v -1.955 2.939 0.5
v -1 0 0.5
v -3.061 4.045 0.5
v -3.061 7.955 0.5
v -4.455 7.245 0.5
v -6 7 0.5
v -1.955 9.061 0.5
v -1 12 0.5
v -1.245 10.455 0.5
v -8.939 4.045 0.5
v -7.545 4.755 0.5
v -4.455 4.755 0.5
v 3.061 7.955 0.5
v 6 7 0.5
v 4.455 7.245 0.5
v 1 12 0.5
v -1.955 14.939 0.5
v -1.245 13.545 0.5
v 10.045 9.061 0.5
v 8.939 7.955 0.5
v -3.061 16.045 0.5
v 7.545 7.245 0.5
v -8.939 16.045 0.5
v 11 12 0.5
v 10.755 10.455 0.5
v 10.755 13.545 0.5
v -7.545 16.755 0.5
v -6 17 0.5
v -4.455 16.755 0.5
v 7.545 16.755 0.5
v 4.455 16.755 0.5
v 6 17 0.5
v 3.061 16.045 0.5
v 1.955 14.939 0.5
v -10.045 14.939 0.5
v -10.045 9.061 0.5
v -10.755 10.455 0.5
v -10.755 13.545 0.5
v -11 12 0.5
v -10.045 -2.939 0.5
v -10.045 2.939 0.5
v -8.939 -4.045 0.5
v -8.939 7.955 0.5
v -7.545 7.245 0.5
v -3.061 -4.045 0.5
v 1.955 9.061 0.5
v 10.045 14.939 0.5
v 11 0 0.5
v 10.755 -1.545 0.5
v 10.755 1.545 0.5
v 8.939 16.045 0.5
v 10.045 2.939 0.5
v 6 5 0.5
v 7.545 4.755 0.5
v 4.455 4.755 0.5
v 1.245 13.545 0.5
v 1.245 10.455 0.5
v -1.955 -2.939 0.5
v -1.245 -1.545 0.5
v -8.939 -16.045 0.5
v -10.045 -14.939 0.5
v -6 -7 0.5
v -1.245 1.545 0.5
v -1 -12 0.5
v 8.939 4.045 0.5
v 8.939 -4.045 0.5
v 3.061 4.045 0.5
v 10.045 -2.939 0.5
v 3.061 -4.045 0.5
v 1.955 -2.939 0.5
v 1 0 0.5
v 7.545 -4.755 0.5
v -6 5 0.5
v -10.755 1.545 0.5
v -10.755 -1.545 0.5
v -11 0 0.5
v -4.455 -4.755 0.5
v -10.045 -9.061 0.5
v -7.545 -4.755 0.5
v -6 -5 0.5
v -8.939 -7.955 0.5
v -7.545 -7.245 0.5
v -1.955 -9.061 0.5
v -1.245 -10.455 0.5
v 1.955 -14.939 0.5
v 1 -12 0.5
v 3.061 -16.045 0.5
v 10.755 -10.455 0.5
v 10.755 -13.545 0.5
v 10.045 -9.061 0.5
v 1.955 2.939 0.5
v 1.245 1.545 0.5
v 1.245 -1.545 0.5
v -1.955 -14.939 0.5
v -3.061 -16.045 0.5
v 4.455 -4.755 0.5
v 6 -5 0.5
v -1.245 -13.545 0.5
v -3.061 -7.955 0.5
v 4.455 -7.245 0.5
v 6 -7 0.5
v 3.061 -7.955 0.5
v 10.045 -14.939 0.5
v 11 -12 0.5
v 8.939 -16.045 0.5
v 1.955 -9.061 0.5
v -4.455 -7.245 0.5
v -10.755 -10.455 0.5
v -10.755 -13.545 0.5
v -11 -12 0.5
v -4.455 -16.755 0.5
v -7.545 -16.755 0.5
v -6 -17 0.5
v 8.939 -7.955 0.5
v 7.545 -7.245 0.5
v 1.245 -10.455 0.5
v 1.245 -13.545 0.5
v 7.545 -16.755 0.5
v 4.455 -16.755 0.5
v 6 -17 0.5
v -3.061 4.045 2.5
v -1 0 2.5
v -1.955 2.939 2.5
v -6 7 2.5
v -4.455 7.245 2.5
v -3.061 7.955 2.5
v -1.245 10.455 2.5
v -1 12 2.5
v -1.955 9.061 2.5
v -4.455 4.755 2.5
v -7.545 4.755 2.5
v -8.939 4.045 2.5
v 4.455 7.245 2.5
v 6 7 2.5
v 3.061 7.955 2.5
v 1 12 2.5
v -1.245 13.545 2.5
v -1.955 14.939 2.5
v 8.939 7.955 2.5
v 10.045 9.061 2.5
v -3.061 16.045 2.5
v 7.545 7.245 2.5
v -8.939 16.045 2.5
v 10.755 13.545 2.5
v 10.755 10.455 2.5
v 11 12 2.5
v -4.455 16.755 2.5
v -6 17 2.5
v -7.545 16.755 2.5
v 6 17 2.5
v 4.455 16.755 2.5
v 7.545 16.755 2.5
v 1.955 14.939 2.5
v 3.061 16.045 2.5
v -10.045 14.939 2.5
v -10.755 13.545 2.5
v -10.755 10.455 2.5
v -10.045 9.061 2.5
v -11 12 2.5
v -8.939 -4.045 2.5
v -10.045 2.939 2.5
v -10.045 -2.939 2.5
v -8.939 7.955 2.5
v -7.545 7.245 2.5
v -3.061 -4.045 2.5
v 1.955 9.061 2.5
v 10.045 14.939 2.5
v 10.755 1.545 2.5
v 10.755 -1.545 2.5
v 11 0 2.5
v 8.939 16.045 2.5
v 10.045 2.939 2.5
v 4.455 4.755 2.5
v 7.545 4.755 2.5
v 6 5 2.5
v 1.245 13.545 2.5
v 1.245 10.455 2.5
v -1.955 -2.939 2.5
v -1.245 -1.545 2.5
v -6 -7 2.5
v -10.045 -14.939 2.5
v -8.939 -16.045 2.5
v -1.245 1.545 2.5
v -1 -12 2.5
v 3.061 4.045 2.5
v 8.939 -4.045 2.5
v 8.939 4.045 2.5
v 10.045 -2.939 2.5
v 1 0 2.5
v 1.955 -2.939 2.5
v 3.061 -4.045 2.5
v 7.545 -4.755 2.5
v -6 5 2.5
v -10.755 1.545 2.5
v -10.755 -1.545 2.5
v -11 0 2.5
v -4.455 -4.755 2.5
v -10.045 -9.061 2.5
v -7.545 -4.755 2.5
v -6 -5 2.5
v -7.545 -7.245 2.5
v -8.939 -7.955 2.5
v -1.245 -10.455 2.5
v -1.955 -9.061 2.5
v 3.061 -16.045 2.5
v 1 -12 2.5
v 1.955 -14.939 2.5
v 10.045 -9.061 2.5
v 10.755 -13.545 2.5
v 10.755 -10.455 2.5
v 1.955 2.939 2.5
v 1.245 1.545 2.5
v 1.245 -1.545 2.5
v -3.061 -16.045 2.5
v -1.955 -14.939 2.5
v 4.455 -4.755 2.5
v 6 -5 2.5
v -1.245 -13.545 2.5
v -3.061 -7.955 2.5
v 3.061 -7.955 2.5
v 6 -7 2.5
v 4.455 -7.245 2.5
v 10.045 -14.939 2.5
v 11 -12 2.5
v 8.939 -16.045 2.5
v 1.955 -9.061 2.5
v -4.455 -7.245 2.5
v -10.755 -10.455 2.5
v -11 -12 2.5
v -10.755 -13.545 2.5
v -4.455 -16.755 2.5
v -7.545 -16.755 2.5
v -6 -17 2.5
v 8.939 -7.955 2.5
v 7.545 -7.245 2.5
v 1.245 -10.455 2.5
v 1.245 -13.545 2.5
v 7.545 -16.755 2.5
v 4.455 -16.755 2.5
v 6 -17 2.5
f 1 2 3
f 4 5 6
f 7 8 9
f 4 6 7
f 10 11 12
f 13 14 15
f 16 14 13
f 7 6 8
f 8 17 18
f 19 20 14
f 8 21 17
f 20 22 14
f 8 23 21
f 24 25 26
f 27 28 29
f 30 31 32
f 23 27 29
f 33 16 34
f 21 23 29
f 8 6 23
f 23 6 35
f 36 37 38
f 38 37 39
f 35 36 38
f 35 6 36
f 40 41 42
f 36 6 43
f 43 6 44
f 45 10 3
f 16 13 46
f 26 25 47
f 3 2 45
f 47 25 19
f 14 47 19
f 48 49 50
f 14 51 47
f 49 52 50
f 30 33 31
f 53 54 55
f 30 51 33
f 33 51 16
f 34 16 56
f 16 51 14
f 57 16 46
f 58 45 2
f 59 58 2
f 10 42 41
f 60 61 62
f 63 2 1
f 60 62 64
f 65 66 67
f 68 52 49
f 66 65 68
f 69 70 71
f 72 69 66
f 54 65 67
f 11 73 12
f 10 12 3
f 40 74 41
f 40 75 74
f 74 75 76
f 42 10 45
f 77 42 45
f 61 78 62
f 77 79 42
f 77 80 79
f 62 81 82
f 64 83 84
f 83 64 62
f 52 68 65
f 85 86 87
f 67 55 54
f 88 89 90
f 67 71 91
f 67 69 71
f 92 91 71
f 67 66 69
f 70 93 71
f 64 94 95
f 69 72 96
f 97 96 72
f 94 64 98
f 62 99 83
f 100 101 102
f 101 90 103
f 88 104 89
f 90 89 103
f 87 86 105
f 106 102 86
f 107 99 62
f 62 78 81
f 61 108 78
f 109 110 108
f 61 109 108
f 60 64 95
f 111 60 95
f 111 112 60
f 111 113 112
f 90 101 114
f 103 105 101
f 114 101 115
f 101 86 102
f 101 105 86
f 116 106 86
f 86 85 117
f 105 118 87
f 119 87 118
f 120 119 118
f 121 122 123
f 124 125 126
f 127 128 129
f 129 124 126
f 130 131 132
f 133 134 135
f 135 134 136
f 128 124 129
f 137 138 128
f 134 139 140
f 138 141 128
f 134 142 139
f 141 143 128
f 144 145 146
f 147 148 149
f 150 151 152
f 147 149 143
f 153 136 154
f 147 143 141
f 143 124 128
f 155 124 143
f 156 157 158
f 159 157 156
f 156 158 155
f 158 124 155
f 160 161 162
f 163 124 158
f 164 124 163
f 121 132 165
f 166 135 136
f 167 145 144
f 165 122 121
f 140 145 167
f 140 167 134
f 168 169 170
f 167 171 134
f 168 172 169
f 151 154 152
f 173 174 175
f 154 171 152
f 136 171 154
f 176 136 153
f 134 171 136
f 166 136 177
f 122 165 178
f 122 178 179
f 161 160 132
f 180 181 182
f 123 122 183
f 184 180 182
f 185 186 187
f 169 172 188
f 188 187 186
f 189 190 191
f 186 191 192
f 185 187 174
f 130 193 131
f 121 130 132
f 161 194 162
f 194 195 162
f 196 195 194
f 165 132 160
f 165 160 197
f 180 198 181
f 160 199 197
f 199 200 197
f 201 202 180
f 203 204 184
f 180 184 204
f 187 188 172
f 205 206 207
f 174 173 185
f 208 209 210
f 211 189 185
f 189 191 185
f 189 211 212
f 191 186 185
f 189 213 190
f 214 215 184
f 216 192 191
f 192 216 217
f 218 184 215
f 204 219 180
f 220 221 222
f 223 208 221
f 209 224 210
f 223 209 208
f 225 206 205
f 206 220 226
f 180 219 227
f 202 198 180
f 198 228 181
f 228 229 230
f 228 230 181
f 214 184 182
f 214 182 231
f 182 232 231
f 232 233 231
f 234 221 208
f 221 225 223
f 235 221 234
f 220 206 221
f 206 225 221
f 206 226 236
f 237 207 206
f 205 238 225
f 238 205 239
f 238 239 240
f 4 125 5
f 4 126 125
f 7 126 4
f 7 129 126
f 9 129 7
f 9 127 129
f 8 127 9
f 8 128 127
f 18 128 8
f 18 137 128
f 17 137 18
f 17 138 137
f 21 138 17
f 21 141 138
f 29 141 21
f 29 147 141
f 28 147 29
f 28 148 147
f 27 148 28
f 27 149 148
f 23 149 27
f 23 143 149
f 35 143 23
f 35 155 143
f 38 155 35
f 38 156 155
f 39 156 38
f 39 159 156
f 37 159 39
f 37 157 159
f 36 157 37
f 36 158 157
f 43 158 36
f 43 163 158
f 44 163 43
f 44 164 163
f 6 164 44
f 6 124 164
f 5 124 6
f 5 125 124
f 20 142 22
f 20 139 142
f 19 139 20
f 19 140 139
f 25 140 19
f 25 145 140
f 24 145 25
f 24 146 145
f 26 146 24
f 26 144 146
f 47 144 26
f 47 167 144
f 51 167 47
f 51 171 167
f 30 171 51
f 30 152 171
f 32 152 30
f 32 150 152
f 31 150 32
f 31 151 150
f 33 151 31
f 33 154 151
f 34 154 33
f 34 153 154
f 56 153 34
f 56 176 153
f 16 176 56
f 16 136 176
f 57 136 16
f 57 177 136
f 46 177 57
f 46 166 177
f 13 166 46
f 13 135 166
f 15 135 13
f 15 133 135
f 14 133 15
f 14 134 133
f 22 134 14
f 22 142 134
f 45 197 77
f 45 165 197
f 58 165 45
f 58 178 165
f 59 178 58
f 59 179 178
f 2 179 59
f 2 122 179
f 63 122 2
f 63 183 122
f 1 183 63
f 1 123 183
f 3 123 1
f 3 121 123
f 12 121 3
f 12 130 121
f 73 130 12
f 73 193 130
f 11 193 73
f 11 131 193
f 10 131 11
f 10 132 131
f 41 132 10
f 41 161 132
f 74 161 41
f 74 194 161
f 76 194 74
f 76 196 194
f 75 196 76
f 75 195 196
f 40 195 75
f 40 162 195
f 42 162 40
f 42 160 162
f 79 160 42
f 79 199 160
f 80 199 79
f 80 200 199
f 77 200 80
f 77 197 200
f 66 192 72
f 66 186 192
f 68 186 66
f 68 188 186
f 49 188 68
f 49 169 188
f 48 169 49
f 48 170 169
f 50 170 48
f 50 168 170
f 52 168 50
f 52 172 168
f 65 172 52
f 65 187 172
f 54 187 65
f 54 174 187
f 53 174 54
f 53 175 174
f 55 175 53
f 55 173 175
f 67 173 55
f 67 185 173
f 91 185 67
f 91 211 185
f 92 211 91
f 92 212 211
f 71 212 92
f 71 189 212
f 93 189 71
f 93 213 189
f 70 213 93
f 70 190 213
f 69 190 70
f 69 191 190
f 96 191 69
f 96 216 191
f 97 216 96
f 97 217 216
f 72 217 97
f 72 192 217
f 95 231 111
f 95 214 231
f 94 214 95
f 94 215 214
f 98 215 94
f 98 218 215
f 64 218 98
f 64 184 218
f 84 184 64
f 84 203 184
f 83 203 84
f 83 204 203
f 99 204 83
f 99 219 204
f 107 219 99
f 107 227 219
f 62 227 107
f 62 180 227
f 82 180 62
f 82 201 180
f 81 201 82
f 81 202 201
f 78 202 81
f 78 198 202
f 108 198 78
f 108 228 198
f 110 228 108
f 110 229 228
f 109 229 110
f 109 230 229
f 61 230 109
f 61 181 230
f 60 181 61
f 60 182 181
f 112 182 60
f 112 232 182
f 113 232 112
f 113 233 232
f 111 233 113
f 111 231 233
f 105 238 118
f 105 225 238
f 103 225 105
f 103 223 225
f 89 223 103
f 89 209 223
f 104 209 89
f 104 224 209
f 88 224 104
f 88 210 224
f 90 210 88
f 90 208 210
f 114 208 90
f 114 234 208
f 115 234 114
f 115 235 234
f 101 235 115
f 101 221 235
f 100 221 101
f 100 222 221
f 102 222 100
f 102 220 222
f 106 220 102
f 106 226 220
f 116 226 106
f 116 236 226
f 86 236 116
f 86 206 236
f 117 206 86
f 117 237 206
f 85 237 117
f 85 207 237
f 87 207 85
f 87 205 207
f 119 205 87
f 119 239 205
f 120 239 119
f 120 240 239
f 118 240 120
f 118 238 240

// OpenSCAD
/* [Printing] */
//layer height
layerHght=0.2;
//how many layers above magnets
minTopLayers=2;
//how many layers below magnets
minBotLayers=2;

/* [Magnets] */
magShape="disc"; //["disc","block"]
magDiscDia=10;
magBlckXYDims=[4,8];
magThck=2;
magCount=[2,3];
magPitch=[12,12];
//lateral spacing for magnets
magLatSpcng=0.1;
//z-spacing for magnets
magZSpcng=0.1;

/* [Body] */
bdySizeMethod="fromMagnets"; //["fromMagnets" : "calculate minimal size","custom size"]
bdyEdgeStyle="sharp"; //["sharp", "chamfer", "round"]
//size of chamfer or rounding (limited)
bdyEdgeSize=2;
bdyBrmWdth=3;
bdyCstmDims=[20,20,5];
bdyRad=3;

/* [Colors] */
bdyCol="#DDDDDD"; //color
magCol="#888888"; //color

/* [show] */
showBody=true;
showMagnets=true;
showXRay=true;

quality=20; //[20:4:100]

/* [Hidden] */
$fn=quality;
fudge=0.1;

magDims= magShape=="disc" ? [magDiscDia,magDiscDia,magThck] : [magBlckXYDims.x,magBlckXYDims.y,magThck];
bdyDims= bdySizeMethod=="fromMagnets" ? 
  [(magCount.x-1)*magPitch.x+magDims.x+bdyBrmWdth*2,
   (magCount.y-1)*magPitch.y+magDims.y+bdyBrmWdth*2,
   magThck+layerHght*(minTopLayers+minBotLayers)+magZSpcng*2] :
  bdyCstmDims;

//-- ASY --

 
if (showBody)  
  if (showXRay) 
    %difference(){  
      body();  
      magnets(true);
    }
  else 
    color(bdyCol) difference(){  
      body();  
      magnets(true);
    }
   
if (showMagnets)
  color(magCol) magnets(false);

  
// -- Modules --  
module body(){
  hull() for (ix=[-1,1],iy=[-1,1])
    translate([ix*(bdyDims.x/2-bdyRad),iy*(bdyDims.y/2-bdyRad)]) corner();;
  
  module corner(){
    
    edgeSize= min(bdyEdgeSize,bdyDims.z,bdyRad);
    if (bdyEdgeStyle=="sharp")
      cylinder(r=bdyRad,h=bdyDims.z);
    else {
      cylinder(r=bdyRad,h=bdyDims.z-edgeSize);
      cylinder(r=bdyRad-edgeSize,h=bdyDims.z);
    }
    if (bdyEdgeStyle=="round")
      translate([0,0,bdyDims.z-edgeSize]) rotate_extrude() 
        translate([bdyRad-edgeSize,0]) intersection(){
          circle(edgeSize);
          square(edgeSize);
        }
  }
}

module magnets(cut=true){
  spcng= cut ? [magLatSpcng,magLatSpcng,magZSpcng] : [0,0,0];
  zOffset= cut ? 0 : magZSpcng;
  fdg= cut && !(minTopLayers && minBotLayers) ? fudge : 0;
  thisMagThck=magThck+spcng.z*2+fdg;
  
  echo("fdg",fdg);
  translate([0,0,thisMagThck/2+layerHght*minBotLayers-fdg+zOffset]) linear_extrude(thisMagThck,center=true)
    for (ix=[-(magCount.x-1)/2:(magCount.x-1)/2],iy=[-(magCount.y-1)/2:(magCount.y-1)/2])
      translate([ix*magPitch.x,iy*magPitch.y]){
        if (magShape=="disc") circle(d=magDiscDia+spcng.x*2);
        else square(magBlckXYDims+[spcng.x,spcng.x],true);
    }
    
}
